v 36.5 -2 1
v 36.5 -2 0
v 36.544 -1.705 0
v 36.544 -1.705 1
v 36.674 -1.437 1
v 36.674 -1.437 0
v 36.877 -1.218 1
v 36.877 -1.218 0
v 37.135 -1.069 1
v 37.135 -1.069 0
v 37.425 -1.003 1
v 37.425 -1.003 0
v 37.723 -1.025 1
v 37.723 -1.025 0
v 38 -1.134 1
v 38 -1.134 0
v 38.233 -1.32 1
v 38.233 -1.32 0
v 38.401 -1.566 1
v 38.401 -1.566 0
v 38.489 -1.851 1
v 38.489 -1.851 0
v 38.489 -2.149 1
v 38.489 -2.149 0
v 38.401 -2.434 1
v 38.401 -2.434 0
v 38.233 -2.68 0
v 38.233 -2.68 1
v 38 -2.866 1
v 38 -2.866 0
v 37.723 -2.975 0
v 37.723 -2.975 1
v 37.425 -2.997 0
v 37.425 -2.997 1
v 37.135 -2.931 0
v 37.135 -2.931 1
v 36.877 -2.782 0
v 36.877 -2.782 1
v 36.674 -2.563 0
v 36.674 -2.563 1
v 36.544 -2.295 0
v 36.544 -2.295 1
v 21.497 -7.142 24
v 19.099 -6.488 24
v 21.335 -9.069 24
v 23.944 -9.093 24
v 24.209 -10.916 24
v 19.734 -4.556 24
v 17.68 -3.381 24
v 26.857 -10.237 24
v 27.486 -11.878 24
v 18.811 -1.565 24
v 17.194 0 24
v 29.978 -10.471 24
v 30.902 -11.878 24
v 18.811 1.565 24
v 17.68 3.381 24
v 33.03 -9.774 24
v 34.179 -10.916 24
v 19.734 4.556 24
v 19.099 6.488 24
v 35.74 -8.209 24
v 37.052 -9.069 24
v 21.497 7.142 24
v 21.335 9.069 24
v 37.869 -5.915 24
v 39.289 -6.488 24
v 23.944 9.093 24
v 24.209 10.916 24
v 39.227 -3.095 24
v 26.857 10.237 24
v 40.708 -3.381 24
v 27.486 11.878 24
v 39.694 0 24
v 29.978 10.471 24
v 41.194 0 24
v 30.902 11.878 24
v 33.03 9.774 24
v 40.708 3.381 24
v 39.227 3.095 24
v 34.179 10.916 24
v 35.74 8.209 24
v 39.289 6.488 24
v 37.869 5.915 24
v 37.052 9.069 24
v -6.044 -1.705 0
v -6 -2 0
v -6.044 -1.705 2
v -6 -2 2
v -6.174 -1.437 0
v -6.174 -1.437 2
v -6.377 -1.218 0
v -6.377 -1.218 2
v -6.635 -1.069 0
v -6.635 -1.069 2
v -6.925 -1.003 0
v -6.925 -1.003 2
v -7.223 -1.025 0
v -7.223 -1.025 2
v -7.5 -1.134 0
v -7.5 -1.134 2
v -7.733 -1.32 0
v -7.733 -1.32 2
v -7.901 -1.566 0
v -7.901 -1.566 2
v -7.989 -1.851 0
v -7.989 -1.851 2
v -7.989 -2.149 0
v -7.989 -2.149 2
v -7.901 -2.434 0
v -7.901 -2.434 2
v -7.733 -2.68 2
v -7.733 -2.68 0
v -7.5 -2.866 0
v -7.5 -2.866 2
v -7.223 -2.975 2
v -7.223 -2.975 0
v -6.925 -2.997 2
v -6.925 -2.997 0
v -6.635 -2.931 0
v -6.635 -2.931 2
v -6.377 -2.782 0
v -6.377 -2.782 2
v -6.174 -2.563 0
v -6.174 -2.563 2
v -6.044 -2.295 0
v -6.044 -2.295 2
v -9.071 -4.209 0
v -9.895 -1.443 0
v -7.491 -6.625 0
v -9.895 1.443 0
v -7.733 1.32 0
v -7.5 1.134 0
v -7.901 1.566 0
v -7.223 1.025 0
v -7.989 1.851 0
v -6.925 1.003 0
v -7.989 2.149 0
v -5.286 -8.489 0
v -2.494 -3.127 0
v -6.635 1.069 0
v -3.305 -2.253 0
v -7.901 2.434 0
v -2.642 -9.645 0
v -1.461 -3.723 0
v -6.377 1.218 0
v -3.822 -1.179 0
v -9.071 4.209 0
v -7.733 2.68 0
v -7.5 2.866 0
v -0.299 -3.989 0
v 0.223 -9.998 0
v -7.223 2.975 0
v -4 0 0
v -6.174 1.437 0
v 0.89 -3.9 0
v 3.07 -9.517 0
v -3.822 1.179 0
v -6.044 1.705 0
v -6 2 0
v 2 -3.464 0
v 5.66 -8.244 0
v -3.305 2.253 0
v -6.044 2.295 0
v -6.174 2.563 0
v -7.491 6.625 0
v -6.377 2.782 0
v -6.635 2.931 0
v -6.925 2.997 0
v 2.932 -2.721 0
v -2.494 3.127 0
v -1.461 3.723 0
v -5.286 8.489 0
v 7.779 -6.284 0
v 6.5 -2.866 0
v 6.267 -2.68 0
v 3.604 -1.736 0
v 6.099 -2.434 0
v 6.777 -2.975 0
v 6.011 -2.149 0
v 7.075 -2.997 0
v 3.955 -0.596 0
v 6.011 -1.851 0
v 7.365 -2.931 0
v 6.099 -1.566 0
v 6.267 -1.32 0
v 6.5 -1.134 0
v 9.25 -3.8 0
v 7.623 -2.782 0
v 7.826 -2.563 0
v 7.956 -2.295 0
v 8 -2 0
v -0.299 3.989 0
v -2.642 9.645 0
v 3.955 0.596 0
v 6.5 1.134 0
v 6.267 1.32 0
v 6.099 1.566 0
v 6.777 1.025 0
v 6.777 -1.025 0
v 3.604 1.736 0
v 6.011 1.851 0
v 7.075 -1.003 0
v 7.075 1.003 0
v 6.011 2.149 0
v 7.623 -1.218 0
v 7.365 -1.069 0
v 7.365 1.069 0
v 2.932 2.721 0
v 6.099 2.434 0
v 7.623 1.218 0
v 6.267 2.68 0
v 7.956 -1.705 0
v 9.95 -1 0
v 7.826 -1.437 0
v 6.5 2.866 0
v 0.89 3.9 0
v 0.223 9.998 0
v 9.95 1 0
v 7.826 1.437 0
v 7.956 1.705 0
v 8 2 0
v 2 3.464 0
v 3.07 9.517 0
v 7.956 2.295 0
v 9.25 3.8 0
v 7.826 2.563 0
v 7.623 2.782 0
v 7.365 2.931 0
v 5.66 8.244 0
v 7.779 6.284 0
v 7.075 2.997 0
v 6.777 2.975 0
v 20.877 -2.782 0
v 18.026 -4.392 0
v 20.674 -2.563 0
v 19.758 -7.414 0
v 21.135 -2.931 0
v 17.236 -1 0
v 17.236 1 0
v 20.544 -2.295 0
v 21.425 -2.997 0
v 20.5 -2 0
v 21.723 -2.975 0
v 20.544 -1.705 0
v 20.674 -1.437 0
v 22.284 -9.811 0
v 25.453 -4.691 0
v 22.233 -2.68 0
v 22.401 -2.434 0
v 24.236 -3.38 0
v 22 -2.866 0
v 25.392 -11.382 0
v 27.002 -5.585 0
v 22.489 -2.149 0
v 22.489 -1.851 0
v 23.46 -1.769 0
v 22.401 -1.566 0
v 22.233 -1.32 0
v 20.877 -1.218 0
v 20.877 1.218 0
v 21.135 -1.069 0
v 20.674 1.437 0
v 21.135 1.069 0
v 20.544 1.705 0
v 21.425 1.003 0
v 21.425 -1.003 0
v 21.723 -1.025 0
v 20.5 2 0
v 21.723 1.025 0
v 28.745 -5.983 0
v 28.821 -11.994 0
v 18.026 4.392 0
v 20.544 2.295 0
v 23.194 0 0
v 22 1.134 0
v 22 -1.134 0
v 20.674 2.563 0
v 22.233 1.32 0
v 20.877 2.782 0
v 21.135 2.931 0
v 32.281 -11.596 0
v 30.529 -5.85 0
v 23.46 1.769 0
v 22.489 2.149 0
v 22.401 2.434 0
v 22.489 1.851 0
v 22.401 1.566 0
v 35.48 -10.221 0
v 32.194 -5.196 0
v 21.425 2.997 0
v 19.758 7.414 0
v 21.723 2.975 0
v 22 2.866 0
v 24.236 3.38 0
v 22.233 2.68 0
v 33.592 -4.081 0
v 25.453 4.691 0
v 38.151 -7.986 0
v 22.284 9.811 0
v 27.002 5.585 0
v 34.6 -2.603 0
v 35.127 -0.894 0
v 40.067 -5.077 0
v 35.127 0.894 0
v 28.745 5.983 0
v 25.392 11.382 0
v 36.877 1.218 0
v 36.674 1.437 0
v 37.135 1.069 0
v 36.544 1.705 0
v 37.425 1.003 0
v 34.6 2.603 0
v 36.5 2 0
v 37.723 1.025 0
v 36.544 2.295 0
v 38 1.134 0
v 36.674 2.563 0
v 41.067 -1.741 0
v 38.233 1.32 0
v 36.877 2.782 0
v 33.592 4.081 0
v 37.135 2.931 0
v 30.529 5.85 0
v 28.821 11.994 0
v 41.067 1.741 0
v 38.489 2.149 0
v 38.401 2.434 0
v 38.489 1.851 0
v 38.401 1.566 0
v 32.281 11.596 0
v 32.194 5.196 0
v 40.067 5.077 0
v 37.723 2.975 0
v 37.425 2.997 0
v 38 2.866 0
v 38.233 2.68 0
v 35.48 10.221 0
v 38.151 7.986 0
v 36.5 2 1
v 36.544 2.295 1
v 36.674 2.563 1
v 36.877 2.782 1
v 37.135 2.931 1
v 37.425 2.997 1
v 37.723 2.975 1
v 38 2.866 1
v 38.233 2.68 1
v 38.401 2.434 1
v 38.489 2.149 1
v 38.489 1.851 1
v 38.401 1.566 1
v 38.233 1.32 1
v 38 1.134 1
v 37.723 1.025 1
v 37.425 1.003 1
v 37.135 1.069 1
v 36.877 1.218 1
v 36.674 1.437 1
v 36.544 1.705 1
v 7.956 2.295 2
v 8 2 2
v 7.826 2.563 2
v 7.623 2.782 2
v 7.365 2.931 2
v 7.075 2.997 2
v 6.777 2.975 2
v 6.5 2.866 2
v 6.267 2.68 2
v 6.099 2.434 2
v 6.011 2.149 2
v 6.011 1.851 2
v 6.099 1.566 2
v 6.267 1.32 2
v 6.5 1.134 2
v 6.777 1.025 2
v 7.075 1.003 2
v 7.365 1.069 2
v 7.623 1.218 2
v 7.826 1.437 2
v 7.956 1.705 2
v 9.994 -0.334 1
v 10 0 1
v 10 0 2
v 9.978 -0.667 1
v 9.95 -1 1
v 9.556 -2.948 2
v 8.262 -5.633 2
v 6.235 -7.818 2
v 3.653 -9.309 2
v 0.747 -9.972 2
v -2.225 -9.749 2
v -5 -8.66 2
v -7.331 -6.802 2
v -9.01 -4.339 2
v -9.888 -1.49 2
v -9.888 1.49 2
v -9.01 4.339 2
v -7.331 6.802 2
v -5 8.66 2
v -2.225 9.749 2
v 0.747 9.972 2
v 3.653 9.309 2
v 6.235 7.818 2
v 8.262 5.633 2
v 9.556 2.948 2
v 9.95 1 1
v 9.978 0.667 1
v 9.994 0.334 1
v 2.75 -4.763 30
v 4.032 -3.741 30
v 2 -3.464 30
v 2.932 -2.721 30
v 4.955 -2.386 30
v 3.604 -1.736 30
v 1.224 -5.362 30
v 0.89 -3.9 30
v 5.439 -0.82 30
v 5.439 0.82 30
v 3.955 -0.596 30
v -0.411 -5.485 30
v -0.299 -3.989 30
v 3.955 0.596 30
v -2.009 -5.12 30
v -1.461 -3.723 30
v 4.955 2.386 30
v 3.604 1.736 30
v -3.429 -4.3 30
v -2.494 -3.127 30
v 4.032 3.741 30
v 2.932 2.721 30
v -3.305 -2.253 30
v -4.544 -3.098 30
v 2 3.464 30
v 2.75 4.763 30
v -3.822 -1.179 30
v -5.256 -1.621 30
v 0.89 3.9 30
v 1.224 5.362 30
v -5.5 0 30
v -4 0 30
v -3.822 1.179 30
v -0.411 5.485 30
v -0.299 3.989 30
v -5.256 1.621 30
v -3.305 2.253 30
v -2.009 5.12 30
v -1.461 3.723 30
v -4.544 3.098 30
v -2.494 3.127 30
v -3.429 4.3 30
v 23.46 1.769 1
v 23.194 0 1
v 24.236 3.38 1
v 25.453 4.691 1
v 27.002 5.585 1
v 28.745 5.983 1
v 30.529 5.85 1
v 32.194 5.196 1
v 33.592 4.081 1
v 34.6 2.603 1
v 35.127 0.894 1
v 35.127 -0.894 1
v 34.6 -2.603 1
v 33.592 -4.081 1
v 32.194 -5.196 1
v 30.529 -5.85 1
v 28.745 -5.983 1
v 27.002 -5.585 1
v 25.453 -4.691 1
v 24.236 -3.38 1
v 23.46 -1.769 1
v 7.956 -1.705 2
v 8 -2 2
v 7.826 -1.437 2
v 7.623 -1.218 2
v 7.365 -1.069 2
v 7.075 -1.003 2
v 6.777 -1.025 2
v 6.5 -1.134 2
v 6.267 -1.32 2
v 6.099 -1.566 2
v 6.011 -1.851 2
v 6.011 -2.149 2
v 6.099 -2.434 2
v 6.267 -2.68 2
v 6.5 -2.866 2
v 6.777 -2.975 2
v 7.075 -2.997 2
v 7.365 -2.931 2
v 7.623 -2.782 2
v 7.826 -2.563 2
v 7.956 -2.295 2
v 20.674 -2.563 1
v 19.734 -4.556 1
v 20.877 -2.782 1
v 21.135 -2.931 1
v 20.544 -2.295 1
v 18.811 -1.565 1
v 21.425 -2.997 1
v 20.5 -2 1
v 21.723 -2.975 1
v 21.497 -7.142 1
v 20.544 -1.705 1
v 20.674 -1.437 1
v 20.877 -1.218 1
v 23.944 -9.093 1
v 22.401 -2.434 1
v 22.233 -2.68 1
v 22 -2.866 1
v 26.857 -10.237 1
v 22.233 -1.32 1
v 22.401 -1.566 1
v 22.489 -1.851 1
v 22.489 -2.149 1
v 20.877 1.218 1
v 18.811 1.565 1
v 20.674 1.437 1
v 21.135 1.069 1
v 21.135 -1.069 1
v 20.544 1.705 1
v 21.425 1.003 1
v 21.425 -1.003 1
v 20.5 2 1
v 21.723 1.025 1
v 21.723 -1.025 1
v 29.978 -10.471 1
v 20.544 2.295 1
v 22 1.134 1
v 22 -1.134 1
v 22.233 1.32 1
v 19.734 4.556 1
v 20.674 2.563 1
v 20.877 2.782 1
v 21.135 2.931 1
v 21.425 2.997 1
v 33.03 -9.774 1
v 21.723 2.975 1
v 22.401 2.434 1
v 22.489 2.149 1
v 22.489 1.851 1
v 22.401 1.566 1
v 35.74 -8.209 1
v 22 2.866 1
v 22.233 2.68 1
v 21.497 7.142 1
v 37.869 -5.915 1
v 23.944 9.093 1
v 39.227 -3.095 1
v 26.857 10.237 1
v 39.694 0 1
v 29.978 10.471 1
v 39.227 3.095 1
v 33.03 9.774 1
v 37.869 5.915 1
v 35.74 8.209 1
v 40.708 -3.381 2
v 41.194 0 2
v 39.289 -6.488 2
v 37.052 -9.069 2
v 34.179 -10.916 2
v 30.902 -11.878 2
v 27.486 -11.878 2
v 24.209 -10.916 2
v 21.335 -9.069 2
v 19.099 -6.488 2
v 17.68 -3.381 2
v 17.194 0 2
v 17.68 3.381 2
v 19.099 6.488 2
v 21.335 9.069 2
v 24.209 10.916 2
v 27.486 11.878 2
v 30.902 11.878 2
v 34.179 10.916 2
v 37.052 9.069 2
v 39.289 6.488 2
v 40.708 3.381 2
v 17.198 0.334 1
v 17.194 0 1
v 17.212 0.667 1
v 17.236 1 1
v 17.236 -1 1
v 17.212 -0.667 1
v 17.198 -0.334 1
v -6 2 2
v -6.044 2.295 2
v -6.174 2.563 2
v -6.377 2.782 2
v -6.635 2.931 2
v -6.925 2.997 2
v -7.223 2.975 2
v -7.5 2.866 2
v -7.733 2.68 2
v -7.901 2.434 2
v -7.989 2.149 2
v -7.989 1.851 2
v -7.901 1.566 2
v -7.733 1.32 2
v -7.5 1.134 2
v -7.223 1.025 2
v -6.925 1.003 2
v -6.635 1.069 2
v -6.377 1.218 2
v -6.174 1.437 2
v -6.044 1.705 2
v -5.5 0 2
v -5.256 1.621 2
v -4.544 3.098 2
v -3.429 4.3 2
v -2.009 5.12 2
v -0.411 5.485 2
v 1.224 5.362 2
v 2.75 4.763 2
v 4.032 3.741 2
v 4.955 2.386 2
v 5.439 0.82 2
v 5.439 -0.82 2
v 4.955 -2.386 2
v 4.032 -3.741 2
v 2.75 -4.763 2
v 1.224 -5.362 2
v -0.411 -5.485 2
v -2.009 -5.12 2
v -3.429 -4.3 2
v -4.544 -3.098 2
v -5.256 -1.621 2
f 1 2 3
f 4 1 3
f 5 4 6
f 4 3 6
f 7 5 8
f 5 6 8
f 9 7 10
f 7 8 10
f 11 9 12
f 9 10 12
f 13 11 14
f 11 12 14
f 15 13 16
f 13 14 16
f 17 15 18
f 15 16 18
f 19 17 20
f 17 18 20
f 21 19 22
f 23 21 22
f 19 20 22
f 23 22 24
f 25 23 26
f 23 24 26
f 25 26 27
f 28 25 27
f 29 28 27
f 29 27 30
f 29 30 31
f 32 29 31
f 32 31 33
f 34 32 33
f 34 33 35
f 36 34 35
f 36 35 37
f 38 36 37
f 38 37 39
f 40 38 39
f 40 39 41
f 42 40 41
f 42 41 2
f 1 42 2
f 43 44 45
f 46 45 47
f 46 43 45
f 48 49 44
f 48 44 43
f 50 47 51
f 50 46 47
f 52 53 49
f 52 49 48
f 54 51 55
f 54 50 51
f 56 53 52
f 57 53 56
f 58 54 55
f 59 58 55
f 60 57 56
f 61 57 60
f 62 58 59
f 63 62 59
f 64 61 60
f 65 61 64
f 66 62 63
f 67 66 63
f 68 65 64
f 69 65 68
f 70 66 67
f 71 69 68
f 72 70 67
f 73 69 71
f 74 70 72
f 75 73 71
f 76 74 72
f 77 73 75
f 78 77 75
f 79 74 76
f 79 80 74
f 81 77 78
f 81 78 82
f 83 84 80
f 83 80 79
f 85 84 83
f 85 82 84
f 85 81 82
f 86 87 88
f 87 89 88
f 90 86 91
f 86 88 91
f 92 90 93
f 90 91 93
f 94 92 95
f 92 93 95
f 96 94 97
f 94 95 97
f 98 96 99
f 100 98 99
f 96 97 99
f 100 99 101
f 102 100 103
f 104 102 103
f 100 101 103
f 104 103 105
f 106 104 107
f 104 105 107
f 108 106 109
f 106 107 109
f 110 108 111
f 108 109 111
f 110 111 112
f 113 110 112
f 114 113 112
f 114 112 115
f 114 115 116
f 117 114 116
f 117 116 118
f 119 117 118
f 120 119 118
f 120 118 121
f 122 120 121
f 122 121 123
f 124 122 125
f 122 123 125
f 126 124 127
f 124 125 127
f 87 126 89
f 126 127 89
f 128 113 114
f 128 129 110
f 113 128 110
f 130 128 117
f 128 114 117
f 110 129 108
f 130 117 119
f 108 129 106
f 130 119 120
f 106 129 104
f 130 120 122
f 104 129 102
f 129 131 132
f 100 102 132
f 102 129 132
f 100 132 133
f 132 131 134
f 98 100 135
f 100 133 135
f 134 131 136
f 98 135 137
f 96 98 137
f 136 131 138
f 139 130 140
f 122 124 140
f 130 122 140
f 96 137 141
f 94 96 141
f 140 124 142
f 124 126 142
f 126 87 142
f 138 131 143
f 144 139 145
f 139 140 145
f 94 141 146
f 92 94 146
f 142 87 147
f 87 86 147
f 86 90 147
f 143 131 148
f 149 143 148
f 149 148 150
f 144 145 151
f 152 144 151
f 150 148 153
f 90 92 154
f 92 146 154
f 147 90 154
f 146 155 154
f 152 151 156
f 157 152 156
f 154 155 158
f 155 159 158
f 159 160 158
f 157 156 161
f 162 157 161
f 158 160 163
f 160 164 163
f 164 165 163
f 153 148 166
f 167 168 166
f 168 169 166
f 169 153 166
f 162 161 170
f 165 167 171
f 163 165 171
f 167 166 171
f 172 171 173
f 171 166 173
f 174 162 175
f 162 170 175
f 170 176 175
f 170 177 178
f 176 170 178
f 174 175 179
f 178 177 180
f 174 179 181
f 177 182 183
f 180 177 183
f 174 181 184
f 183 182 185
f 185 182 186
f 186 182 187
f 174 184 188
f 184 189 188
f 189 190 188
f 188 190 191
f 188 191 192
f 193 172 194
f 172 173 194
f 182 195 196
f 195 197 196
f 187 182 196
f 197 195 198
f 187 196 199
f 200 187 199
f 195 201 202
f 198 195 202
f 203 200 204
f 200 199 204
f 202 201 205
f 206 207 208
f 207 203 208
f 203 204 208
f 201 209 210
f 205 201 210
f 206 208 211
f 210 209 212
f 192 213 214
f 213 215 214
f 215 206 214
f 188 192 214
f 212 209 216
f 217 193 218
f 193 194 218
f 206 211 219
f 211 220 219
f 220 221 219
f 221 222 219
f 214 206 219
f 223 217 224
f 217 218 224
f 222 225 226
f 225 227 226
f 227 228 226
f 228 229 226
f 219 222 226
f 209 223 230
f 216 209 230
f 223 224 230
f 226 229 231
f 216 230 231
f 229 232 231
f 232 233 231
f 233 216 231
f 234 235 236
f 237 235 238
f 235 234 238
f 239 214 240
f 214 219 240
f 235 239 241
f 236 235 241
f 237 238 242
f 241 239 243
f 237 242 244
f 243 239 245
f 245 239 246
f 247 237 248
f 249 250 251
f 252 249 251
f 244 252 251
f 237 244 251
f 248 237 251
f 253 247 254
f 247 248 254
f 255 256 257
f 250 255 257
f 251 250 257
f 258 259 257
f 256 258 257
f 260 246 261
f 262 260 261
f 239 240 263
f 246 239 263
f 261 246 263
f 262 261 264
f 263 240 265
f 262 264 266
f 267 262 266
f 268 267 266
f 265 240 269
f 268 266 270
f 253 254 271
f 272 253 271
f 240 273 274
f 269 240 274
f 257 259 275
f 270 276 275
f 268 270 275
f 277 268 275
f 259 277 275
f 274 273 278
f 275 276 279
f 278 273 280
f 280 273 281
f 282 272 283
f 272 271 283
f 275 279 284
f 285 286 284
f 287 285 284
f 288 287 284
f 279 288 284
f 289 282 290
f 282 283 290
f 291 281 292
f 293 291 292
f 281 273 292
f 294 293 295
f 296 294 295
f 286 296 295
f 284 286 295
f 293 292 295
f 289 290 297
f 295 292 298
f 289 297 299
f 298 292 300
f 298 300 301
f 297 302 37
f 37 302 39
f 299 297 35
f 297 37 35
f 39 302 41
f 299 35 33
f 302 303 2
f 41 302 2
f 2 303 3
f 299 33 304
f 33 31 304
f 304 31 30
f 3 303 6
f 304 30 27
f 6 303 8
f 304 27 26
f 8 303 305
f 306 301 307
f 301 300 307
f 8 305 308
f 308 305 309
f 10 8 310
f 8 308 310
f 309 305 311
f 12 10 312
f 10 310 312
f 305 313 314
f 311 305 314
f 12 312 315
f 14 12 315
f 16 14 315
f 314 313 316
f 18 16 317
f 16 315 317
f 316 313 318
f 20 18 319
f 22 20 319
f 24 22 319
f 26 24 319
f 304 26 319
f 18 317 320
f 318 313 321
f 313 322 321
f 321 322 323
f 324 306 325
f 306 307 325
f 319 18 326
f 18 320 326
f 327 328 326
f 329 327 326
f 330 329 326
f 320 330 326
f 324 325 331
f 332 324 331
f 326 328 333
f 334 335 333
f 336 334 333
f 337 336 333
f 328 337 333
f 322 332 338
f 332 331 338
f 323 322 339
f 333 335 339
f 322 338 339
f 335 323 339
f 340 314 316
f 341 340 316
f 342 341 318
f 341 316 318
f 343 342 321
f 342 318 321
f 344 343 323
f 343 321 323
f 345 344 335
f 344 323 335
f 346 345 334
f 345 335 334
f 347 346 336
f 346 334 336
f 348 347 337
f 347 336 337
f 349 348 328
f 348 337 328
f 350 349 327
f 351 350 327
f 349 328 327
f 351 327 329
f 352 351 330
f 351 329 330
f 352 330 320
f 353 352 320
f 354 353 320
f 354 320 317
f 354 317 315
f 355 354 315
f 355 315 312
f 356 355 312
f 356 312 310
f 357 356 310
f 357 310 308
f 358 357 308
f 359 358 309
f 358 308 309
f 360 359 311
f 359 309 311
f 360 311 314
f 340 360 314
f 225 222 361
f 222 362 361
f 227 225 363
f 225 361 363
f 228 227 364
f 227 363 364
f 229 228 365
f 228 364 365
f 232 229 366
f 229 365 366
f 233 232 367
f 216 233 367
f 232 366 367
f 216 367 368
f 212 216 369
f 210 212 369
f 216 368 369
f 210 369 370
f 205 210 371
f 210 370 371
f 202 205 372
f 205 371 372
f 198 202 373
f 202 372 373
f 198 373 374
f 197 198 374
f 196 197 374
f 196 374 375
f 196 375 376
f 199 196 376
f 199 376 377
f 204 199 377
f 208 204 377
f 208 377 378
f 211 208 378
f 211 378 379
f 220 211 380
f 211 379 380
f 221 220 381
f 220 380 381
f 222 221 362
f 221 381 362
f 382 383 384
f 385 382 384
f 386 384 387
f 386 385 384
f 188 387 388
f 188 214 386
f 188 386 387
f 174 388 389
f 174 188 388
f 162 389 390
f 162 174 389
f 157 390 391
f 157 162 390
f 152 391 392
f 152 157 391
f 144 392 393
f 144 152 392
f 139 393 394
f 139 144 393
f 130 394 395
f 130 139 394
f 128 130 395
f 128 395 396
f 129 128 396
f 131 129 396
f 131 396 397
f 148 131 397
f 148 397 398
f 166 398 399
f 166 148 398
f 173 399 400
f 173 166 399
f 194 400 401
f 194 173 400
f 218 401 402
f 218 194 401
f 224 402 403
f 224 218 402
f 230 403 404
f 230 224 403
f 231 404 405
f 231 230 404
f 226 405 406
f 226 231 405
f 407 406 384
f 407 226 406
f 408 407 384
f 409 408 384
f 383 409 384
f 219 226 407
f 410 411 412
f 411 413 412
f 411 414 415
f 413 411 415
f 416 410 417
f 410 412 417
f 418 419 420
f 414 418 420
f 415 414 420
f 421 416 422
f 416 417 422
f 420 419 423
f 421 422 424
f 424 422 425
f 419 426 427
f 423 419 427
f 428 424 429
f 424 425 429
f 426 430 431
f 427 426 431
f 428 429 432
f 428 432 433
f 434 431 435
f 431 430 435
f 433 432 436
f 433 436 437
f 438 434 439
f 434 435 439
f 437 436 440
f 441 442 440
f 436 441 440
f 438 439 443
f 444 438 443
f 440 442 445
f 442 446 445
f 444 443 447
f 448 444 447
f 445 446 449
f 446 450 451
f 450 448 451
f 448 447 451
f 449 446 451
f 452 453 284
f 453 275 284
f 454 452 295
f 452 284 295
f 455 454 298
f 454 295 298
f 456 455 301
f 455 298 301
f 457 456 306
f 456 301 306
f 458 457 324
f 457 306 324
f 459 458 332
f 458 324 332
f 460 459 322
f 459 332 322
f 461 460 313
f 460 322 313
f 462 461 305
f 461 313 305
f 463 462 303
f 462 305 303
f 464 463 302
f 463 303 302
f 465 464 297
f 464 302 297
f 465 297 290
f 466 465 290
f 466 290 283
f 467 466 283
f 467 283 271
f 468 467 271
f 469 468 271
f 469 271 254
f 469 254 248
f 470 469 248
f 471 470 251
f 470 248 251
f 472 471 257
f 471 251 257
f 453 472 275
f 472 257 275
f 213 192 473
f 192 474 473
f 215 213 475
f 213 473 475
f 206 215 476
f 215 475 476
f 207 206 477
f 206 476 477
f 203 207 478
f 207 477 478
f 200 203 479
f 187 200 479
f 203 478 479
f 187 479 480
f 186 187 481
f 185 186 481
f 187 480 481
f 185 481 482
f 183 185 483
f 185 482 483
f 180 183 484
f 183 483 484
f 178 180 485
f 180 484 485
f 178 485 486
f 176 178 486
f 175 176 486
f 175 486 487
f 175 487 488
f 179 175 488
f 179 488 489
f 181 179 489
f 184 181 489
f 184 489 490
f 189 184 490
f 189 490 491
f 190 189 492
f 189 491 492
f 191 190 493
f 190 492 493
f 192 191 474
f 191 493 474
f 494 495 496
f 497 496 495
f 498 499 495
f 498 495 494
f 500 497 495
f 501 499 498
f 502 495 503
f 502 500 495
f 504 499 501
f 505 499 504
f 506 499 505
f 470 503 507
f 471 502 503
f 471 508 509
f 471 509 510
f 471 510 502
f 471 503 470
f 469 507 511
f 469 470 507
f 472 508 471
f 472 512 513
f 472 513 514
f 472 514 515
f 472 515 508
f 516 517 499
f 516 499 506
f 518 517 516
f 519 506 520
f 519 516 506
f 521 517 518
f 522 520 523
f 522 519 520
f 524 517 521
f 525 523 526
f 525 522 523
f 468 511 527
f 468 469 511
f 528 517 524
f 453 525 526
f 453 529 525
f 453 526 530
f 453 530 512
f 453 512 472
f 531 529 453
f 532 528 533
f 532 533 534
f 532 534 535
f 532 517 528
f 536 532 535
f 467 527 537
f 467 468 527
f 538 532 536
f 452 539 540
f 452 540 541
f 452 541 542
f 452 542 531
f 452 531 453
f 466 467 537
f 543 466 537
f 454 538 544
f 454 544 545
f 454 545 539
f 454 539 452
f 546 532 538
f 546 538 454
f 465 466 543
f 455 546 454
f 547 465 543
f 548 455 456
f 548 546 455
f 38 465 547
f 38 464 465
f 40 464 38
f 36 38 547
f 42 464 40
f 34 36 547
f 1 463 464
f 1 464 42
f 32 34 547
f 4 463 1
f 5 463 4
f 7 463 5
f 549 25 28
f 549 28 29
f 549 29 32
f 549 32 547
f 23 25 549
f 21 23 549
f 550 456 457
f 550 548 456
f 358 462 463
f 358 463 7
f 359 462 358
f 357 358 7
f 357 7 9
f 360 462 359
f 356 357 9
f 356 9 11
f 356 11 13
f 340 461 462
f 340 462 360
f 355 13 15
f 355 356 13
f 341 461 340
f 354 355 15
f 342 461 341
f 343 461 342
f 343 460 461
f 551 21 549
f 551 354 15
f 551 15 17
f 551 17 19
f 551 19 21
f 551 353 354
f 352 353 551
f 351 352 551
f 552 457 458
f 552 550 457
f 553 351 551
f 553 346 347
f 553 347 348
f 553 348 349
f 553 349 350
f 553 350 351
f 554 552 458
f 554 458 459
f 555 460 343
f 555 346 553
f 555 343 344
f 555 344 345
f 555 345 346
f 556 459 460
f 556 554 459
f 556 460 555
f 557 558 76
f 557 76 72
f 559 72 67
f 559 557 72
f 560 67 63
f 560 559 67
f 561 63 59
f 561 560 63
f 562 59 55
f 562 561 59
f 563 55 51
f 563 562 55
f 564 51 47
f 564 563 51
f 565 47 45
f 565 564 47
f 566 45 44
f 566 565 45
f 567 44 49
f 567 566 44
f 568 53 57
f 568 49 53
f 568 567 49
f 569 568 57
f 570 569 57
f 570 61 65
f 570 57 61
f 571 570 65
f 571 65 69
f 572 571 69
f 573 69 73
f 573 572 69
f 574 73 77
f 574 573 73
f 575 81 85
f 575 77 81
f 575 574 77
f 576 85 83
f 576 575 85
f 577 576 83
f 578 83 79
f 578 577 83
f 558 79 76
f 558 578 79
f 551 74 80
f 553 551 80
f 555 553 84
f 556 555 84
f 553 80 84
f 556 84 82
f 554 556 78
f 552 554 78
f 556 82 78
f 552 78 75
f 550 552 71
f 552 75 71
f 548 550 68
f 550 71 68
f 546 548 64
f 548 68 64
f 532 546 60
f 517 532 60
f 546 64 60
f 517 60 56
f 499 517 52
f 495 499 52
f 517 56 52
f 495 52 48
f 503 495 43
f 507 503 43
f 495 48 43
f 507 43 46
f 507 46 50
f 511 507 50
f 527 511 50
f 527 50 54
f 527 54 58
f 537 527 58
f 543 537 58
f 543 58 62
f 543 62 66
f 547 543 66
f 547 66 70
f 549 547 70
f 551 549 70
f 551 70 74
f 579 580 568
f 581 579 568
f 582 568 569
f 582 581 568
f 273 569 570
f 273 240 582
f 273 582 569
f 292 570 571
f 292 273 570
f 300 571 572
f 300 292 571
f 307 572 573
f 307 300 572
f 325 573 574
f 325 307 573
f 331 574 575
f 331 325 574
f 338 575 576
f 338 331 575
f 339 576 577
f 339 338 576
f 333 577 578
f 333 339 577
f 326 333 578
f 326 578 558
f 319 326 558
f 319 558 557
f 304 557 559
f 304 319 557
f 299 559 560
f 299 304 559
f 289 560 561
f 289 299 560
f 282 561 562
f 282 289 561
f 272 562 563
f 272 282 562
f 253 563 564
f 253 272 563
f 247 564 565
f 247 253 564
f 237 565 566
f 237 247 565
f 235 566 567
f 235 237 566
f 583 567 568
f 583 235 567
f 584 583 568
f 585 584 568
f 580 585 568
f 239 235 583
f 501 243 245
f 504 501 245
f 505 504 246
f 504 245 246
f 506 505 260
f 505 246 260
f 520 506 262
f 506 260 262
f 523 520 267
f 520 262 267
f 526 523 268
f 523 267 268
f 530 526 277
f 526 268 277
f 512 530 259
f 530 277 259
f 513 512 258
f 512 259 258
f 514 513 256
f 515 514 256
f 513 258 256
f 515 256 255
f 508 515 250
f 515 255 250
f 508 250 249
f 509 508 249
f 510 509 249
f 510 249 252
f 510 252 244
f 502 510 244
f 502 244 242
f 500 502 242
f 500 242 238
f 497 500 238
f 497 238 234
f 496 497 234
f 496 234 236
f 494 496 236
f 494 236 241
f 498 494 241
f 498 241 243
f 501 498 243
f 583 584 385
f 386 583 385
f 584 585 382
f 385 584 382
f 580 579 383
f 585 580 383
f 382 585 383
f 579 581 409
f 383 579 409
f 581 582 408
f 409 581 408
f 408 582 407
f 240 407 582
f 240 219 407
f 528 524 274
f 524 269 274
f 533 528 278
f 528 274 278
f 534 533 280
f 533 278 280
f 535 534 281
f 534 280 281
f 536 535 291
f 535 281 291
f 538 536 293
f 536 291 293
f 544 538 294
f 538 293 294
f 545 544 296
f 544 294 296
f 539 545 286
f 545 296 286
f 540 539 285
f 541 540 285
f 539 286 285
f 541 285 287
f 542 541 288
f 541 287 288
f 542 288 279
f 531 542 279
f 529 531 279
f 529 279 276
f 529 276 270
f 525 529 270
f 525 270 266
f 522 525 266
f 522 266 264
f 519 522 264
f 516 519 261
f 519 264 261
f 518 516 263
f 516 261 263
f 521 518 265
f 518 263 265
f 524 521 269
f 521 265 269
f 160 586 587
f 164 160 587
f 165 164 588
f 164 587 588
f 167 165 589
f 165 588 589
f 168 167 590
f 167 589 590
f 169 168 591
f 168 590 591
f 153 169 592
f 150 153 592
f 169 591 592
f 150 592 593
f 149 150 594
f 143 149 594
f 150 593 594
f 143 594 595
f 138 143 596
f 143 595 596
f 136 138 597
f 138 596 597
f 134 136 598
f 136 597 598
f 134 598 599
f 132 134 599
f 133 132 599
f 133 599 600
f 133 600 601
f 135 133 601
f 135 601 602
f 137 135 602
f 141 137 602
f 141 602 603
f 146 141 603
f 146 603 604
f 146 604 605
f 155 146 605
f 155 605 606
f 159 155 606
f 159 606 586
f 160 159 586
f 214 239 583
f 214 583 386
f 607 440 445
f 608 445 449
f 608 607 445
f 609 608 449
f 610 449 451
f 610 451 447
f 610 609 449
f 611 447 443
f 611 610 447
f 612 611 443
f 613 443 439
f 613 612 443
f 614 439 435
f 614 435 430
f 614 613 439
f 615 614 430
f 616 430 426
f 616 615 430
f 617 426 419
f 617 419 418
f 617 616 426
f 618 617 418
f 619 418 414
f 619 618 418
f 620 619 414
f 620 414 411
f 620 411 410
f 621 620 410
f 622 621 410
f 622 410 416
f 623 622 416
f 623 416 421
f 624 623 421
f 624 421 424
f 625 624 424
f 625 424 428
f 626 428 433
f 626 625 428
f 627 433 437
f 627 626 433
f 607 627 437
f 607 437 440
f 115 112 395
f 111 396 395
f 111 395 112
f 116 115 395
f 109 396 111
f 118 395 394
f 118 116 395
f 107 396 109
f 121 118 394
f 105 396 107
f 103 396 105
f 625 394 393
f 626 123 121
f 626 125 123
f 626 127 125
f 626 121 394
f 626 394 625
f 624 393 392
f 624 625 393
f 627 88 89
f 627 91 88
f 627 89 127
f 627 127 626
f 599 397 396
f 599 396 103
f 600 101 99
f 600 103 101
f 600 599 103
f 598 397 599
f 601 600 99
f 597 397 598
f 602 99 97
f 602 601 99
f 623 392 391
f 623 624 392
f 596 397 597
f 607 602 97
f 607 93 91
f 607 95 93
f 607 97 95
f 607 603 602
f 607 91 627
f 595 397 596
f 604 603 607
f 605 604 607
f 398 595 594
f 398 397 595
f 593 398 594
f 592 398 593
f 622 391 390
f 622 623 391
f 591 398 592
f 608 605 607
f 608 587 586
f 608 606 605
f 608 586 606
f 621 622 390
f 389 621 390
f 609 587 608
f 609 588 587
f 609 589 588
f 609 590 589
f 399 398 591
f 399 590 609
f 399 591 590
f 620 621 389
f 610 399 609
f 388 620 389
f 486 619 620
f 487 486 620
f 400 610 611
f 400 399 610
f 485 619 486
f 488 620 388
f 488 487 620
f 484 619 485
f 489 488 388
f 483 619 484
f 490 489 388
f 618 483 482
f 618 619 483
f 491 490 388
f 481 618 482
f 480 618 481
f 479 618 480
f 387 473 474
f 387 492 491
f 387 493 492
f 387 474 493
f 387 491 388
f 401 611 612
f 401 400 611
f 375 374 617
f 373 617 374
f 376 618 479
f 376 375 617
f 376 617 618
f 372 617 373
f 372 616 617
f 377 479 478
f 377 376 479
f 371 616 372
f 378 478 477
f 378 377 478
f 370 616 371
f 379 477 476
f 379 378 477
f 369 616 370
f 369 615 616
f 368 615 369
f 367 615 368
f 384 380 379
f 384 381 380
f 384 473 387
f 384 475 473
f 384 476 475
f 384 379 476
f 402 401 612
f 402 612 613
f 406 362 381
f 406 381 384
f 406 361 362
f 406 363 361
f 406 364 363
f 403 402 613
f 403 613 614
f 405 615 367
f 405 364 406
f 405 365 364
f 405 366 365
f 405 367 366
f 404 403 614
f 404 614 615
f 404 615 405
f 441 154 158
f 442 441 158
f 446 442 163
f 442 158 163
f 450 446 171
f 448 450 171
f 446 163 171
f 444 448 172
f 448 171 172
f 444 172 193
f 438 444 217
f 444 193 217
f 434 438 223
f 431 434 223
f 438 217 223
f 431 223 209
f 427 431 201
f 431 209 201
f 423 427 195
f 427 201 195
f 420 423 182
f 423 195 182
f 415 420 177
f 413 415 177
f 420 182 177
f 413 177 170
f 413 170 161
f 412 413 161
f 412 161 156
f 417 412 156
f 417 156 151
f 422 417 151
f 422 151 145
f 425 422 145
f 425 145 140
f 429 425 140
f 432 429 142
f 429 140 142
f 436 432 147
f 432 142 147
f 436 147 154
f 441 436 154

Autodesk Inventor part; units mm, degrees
ref_plane "YZ Plane" through (0, 0, 0) normal (1, 0, 0) x (0, 1, 0)
ref_plane "XZ Plane" through (0, 0, 0) normal (0, 1, 0) x (-1, 0, 0)
ref_plane "XY Plane" through (0, 0, 0) normal (0, 0, 1) x (1, 0, 0)
sketch "Sketch1" plane through (0, 0, 0) normal (0, 0, 1) x (1, 0, 0)
  circle A0 centre (0, 0) radius 10
  dimension "d0" = 20
extrude "Extrusion1" add sketch "Sketch1" along normal blind 2
sketch "Sketch2" plane through (0, 0, 0) normal (0, 0, -1) x (-1, 0, 0)
  circle A0 centre (0, 0) radius 5.5
  circle A1 centre (0, 0) radius 3.55
  dimension "d3" = 11
  dimension "d6" = 7.1
extrude "Extrusion2" add sketch "Sketch2" against normal blind 30 contours A0 | A1
sketch "Sketch3" plane through (0, 0, 0) normal (0, 0, -1) x (-1, 0, 0)
  point P0 (0, 0)
sketch "Sketch4" plane through (0, 0, 0) normal (0, 0, -1) x (-1, 0, 0)
  point P0 (0, 0)
sketch "Sketch5" plane through (0, 0, 0) normal (0, 0, -1) x (-1, 0, 0)
  circle A0 centre (0, 0) radius 4
  dimension "d7" = 8
extrude "Extrusion3" cut sketch "Sketch5" against normal blind 30
sketch "Sketch6" plane through (0, 0, 2) normal (0, 0, 1) x (1, 0, 0)
  circle A0 centre (7, 2) radius 1
  circle A1 centre (7, -2) radius 1
  circle A2 centre (-7, 2) radius 1
  circle A3 centre (-7, -2) radius 1
  point P0 (0, 0)
  dimension "d16" = 2
  dimension "d17" = 7
  dimension "d18" = 2
  dimension "d19" = 2
  dimension "d20" = 7
  dimension "d21" = 2
  dimension "d53" = 2
  dimension "d54" = 7
  dimension "d55" = 2
  dimension "d56" = 2
  dimension "d57" = 7
  dimension "d58" = 2
extrude "Extrusion4" cut sketch "Sketch6" against normal blind 2
sketch "Sketch7" plane through (0, 0, 0) normal (0, 0, -1) x (-1, 0, 0)
  point P0 (0, 0)
sketch "Sketch8" plane through (0, 0, 0) normal (0, 0, -1) x (-1, 0, 0)
  circle A0 centre (-29.1938, 0) radius 12
  point P0 (0, 0)
  dimension "d24" = 24
extrude "Extrusion5" add sketch "Sketch8" against normal blind 2
sketch "Sketch9" plane through (29.1938, 0, 0) normal (0, 0, -1) x (-1, 0, 0)
  circle A0 centre (0, 0) radius 6
  point P0 (29.1938, 0)
  dimension "d27" = 12
extrude "Extrusion6" cut sketch "Sketch9" against normal blind 1
sketch "Sketch10" plane through (29.1938, 0, 0) normal (0, 0, -1) x (-1, 0, 0)
  point P0 (29.1938, 0)
  point P1 (0, 0)
sketch "Sketch11" plane through (29.1938, 0, 0) normal (0, 0, -1) x (-1, 0, 0)
  circle A0 centre (7.6938, 2) radius 1
  circle A1 centre (-8.3062, 2) radius 1
  circle A2 centre (-8.3062, -2) radius 1
  circle A3 centre (7.6938, -2) radius 1
  point P0 (29.1938, 0)
  dimension "d30" = 21.5
  dimension "d31" = 2
  dimension "d32" = 16
  dimension "d33" = 2
  dimension "d34" = 2
  dimension "d35" = 0
  dimension "d36" = 0
  dimension "d37" = 4
  dimension "d38" = 2
  dimension "d40" = 2
  dimension "d41" = 4
extrude "Extrusion7" cut sketch "Sketch11" against normal blind 2
sketch "Sketch12" plane through (29.1938, 0, 2) normal (0, 0, 1) x (1, 0, 0)
  circle A0 centre (0, 0) radius 4.55
  point P0 (-29.1938, 0)
  dimension "d44" = 9.1
extrude "Extrusion8" cut sketch "Sketch12" against normal blind 1
sketch "Sketch13" plane through (29.1938, 0, 0) normal (0, 0, -1) x (-1, 0, 0)
  line L0 (19.6938, 1) -> (11.6938, 1)
  line L1 (11.6938, 1) -> (11.6938, -1)
  line L2 (11.6938, -1) -> (19.6938, -1)
  line L3 (19.6938, -1) -> (19.6938, 1)
  point P0 (29.1938, 0)
  dimension "d47" = 8
  dimension "d48" = 2
  dimension "d49" = 1
  dimension "d50" = 9.5
extrude "Extrusion9" add sketch "Sketch13" against normal blind 1
sketch "Sketch14" plane through (29.1938, 0, 2) normal (0, 0, 1) x (1, 0, 0)
  point P0 (-29.1938, 0)
sketch "Sketch15" plane through (29.1938, 0, 2) normal (0, 0, 1) x (1, 0, 0)
  circle A0 centre (0, 0) radius 12
  point P0 (-29.1938, 0)
  dimension "d59" = 24
extrude "Extrusion10" add sketch "Sketch15" along normal blind 22
sketch "Sketch16" plane through (29.1938, 0, 24) normal (0, 0, 1) x (1, 0, 0)
  circle A0 centre (0, 0) radius 10.5
  point P0 (-29.1938, 0)
  dimension "d62" = 21
extrude "Extrusion11" cut sketch "Sketch16" against normal blind 23
properties part number "Bobbin01"
